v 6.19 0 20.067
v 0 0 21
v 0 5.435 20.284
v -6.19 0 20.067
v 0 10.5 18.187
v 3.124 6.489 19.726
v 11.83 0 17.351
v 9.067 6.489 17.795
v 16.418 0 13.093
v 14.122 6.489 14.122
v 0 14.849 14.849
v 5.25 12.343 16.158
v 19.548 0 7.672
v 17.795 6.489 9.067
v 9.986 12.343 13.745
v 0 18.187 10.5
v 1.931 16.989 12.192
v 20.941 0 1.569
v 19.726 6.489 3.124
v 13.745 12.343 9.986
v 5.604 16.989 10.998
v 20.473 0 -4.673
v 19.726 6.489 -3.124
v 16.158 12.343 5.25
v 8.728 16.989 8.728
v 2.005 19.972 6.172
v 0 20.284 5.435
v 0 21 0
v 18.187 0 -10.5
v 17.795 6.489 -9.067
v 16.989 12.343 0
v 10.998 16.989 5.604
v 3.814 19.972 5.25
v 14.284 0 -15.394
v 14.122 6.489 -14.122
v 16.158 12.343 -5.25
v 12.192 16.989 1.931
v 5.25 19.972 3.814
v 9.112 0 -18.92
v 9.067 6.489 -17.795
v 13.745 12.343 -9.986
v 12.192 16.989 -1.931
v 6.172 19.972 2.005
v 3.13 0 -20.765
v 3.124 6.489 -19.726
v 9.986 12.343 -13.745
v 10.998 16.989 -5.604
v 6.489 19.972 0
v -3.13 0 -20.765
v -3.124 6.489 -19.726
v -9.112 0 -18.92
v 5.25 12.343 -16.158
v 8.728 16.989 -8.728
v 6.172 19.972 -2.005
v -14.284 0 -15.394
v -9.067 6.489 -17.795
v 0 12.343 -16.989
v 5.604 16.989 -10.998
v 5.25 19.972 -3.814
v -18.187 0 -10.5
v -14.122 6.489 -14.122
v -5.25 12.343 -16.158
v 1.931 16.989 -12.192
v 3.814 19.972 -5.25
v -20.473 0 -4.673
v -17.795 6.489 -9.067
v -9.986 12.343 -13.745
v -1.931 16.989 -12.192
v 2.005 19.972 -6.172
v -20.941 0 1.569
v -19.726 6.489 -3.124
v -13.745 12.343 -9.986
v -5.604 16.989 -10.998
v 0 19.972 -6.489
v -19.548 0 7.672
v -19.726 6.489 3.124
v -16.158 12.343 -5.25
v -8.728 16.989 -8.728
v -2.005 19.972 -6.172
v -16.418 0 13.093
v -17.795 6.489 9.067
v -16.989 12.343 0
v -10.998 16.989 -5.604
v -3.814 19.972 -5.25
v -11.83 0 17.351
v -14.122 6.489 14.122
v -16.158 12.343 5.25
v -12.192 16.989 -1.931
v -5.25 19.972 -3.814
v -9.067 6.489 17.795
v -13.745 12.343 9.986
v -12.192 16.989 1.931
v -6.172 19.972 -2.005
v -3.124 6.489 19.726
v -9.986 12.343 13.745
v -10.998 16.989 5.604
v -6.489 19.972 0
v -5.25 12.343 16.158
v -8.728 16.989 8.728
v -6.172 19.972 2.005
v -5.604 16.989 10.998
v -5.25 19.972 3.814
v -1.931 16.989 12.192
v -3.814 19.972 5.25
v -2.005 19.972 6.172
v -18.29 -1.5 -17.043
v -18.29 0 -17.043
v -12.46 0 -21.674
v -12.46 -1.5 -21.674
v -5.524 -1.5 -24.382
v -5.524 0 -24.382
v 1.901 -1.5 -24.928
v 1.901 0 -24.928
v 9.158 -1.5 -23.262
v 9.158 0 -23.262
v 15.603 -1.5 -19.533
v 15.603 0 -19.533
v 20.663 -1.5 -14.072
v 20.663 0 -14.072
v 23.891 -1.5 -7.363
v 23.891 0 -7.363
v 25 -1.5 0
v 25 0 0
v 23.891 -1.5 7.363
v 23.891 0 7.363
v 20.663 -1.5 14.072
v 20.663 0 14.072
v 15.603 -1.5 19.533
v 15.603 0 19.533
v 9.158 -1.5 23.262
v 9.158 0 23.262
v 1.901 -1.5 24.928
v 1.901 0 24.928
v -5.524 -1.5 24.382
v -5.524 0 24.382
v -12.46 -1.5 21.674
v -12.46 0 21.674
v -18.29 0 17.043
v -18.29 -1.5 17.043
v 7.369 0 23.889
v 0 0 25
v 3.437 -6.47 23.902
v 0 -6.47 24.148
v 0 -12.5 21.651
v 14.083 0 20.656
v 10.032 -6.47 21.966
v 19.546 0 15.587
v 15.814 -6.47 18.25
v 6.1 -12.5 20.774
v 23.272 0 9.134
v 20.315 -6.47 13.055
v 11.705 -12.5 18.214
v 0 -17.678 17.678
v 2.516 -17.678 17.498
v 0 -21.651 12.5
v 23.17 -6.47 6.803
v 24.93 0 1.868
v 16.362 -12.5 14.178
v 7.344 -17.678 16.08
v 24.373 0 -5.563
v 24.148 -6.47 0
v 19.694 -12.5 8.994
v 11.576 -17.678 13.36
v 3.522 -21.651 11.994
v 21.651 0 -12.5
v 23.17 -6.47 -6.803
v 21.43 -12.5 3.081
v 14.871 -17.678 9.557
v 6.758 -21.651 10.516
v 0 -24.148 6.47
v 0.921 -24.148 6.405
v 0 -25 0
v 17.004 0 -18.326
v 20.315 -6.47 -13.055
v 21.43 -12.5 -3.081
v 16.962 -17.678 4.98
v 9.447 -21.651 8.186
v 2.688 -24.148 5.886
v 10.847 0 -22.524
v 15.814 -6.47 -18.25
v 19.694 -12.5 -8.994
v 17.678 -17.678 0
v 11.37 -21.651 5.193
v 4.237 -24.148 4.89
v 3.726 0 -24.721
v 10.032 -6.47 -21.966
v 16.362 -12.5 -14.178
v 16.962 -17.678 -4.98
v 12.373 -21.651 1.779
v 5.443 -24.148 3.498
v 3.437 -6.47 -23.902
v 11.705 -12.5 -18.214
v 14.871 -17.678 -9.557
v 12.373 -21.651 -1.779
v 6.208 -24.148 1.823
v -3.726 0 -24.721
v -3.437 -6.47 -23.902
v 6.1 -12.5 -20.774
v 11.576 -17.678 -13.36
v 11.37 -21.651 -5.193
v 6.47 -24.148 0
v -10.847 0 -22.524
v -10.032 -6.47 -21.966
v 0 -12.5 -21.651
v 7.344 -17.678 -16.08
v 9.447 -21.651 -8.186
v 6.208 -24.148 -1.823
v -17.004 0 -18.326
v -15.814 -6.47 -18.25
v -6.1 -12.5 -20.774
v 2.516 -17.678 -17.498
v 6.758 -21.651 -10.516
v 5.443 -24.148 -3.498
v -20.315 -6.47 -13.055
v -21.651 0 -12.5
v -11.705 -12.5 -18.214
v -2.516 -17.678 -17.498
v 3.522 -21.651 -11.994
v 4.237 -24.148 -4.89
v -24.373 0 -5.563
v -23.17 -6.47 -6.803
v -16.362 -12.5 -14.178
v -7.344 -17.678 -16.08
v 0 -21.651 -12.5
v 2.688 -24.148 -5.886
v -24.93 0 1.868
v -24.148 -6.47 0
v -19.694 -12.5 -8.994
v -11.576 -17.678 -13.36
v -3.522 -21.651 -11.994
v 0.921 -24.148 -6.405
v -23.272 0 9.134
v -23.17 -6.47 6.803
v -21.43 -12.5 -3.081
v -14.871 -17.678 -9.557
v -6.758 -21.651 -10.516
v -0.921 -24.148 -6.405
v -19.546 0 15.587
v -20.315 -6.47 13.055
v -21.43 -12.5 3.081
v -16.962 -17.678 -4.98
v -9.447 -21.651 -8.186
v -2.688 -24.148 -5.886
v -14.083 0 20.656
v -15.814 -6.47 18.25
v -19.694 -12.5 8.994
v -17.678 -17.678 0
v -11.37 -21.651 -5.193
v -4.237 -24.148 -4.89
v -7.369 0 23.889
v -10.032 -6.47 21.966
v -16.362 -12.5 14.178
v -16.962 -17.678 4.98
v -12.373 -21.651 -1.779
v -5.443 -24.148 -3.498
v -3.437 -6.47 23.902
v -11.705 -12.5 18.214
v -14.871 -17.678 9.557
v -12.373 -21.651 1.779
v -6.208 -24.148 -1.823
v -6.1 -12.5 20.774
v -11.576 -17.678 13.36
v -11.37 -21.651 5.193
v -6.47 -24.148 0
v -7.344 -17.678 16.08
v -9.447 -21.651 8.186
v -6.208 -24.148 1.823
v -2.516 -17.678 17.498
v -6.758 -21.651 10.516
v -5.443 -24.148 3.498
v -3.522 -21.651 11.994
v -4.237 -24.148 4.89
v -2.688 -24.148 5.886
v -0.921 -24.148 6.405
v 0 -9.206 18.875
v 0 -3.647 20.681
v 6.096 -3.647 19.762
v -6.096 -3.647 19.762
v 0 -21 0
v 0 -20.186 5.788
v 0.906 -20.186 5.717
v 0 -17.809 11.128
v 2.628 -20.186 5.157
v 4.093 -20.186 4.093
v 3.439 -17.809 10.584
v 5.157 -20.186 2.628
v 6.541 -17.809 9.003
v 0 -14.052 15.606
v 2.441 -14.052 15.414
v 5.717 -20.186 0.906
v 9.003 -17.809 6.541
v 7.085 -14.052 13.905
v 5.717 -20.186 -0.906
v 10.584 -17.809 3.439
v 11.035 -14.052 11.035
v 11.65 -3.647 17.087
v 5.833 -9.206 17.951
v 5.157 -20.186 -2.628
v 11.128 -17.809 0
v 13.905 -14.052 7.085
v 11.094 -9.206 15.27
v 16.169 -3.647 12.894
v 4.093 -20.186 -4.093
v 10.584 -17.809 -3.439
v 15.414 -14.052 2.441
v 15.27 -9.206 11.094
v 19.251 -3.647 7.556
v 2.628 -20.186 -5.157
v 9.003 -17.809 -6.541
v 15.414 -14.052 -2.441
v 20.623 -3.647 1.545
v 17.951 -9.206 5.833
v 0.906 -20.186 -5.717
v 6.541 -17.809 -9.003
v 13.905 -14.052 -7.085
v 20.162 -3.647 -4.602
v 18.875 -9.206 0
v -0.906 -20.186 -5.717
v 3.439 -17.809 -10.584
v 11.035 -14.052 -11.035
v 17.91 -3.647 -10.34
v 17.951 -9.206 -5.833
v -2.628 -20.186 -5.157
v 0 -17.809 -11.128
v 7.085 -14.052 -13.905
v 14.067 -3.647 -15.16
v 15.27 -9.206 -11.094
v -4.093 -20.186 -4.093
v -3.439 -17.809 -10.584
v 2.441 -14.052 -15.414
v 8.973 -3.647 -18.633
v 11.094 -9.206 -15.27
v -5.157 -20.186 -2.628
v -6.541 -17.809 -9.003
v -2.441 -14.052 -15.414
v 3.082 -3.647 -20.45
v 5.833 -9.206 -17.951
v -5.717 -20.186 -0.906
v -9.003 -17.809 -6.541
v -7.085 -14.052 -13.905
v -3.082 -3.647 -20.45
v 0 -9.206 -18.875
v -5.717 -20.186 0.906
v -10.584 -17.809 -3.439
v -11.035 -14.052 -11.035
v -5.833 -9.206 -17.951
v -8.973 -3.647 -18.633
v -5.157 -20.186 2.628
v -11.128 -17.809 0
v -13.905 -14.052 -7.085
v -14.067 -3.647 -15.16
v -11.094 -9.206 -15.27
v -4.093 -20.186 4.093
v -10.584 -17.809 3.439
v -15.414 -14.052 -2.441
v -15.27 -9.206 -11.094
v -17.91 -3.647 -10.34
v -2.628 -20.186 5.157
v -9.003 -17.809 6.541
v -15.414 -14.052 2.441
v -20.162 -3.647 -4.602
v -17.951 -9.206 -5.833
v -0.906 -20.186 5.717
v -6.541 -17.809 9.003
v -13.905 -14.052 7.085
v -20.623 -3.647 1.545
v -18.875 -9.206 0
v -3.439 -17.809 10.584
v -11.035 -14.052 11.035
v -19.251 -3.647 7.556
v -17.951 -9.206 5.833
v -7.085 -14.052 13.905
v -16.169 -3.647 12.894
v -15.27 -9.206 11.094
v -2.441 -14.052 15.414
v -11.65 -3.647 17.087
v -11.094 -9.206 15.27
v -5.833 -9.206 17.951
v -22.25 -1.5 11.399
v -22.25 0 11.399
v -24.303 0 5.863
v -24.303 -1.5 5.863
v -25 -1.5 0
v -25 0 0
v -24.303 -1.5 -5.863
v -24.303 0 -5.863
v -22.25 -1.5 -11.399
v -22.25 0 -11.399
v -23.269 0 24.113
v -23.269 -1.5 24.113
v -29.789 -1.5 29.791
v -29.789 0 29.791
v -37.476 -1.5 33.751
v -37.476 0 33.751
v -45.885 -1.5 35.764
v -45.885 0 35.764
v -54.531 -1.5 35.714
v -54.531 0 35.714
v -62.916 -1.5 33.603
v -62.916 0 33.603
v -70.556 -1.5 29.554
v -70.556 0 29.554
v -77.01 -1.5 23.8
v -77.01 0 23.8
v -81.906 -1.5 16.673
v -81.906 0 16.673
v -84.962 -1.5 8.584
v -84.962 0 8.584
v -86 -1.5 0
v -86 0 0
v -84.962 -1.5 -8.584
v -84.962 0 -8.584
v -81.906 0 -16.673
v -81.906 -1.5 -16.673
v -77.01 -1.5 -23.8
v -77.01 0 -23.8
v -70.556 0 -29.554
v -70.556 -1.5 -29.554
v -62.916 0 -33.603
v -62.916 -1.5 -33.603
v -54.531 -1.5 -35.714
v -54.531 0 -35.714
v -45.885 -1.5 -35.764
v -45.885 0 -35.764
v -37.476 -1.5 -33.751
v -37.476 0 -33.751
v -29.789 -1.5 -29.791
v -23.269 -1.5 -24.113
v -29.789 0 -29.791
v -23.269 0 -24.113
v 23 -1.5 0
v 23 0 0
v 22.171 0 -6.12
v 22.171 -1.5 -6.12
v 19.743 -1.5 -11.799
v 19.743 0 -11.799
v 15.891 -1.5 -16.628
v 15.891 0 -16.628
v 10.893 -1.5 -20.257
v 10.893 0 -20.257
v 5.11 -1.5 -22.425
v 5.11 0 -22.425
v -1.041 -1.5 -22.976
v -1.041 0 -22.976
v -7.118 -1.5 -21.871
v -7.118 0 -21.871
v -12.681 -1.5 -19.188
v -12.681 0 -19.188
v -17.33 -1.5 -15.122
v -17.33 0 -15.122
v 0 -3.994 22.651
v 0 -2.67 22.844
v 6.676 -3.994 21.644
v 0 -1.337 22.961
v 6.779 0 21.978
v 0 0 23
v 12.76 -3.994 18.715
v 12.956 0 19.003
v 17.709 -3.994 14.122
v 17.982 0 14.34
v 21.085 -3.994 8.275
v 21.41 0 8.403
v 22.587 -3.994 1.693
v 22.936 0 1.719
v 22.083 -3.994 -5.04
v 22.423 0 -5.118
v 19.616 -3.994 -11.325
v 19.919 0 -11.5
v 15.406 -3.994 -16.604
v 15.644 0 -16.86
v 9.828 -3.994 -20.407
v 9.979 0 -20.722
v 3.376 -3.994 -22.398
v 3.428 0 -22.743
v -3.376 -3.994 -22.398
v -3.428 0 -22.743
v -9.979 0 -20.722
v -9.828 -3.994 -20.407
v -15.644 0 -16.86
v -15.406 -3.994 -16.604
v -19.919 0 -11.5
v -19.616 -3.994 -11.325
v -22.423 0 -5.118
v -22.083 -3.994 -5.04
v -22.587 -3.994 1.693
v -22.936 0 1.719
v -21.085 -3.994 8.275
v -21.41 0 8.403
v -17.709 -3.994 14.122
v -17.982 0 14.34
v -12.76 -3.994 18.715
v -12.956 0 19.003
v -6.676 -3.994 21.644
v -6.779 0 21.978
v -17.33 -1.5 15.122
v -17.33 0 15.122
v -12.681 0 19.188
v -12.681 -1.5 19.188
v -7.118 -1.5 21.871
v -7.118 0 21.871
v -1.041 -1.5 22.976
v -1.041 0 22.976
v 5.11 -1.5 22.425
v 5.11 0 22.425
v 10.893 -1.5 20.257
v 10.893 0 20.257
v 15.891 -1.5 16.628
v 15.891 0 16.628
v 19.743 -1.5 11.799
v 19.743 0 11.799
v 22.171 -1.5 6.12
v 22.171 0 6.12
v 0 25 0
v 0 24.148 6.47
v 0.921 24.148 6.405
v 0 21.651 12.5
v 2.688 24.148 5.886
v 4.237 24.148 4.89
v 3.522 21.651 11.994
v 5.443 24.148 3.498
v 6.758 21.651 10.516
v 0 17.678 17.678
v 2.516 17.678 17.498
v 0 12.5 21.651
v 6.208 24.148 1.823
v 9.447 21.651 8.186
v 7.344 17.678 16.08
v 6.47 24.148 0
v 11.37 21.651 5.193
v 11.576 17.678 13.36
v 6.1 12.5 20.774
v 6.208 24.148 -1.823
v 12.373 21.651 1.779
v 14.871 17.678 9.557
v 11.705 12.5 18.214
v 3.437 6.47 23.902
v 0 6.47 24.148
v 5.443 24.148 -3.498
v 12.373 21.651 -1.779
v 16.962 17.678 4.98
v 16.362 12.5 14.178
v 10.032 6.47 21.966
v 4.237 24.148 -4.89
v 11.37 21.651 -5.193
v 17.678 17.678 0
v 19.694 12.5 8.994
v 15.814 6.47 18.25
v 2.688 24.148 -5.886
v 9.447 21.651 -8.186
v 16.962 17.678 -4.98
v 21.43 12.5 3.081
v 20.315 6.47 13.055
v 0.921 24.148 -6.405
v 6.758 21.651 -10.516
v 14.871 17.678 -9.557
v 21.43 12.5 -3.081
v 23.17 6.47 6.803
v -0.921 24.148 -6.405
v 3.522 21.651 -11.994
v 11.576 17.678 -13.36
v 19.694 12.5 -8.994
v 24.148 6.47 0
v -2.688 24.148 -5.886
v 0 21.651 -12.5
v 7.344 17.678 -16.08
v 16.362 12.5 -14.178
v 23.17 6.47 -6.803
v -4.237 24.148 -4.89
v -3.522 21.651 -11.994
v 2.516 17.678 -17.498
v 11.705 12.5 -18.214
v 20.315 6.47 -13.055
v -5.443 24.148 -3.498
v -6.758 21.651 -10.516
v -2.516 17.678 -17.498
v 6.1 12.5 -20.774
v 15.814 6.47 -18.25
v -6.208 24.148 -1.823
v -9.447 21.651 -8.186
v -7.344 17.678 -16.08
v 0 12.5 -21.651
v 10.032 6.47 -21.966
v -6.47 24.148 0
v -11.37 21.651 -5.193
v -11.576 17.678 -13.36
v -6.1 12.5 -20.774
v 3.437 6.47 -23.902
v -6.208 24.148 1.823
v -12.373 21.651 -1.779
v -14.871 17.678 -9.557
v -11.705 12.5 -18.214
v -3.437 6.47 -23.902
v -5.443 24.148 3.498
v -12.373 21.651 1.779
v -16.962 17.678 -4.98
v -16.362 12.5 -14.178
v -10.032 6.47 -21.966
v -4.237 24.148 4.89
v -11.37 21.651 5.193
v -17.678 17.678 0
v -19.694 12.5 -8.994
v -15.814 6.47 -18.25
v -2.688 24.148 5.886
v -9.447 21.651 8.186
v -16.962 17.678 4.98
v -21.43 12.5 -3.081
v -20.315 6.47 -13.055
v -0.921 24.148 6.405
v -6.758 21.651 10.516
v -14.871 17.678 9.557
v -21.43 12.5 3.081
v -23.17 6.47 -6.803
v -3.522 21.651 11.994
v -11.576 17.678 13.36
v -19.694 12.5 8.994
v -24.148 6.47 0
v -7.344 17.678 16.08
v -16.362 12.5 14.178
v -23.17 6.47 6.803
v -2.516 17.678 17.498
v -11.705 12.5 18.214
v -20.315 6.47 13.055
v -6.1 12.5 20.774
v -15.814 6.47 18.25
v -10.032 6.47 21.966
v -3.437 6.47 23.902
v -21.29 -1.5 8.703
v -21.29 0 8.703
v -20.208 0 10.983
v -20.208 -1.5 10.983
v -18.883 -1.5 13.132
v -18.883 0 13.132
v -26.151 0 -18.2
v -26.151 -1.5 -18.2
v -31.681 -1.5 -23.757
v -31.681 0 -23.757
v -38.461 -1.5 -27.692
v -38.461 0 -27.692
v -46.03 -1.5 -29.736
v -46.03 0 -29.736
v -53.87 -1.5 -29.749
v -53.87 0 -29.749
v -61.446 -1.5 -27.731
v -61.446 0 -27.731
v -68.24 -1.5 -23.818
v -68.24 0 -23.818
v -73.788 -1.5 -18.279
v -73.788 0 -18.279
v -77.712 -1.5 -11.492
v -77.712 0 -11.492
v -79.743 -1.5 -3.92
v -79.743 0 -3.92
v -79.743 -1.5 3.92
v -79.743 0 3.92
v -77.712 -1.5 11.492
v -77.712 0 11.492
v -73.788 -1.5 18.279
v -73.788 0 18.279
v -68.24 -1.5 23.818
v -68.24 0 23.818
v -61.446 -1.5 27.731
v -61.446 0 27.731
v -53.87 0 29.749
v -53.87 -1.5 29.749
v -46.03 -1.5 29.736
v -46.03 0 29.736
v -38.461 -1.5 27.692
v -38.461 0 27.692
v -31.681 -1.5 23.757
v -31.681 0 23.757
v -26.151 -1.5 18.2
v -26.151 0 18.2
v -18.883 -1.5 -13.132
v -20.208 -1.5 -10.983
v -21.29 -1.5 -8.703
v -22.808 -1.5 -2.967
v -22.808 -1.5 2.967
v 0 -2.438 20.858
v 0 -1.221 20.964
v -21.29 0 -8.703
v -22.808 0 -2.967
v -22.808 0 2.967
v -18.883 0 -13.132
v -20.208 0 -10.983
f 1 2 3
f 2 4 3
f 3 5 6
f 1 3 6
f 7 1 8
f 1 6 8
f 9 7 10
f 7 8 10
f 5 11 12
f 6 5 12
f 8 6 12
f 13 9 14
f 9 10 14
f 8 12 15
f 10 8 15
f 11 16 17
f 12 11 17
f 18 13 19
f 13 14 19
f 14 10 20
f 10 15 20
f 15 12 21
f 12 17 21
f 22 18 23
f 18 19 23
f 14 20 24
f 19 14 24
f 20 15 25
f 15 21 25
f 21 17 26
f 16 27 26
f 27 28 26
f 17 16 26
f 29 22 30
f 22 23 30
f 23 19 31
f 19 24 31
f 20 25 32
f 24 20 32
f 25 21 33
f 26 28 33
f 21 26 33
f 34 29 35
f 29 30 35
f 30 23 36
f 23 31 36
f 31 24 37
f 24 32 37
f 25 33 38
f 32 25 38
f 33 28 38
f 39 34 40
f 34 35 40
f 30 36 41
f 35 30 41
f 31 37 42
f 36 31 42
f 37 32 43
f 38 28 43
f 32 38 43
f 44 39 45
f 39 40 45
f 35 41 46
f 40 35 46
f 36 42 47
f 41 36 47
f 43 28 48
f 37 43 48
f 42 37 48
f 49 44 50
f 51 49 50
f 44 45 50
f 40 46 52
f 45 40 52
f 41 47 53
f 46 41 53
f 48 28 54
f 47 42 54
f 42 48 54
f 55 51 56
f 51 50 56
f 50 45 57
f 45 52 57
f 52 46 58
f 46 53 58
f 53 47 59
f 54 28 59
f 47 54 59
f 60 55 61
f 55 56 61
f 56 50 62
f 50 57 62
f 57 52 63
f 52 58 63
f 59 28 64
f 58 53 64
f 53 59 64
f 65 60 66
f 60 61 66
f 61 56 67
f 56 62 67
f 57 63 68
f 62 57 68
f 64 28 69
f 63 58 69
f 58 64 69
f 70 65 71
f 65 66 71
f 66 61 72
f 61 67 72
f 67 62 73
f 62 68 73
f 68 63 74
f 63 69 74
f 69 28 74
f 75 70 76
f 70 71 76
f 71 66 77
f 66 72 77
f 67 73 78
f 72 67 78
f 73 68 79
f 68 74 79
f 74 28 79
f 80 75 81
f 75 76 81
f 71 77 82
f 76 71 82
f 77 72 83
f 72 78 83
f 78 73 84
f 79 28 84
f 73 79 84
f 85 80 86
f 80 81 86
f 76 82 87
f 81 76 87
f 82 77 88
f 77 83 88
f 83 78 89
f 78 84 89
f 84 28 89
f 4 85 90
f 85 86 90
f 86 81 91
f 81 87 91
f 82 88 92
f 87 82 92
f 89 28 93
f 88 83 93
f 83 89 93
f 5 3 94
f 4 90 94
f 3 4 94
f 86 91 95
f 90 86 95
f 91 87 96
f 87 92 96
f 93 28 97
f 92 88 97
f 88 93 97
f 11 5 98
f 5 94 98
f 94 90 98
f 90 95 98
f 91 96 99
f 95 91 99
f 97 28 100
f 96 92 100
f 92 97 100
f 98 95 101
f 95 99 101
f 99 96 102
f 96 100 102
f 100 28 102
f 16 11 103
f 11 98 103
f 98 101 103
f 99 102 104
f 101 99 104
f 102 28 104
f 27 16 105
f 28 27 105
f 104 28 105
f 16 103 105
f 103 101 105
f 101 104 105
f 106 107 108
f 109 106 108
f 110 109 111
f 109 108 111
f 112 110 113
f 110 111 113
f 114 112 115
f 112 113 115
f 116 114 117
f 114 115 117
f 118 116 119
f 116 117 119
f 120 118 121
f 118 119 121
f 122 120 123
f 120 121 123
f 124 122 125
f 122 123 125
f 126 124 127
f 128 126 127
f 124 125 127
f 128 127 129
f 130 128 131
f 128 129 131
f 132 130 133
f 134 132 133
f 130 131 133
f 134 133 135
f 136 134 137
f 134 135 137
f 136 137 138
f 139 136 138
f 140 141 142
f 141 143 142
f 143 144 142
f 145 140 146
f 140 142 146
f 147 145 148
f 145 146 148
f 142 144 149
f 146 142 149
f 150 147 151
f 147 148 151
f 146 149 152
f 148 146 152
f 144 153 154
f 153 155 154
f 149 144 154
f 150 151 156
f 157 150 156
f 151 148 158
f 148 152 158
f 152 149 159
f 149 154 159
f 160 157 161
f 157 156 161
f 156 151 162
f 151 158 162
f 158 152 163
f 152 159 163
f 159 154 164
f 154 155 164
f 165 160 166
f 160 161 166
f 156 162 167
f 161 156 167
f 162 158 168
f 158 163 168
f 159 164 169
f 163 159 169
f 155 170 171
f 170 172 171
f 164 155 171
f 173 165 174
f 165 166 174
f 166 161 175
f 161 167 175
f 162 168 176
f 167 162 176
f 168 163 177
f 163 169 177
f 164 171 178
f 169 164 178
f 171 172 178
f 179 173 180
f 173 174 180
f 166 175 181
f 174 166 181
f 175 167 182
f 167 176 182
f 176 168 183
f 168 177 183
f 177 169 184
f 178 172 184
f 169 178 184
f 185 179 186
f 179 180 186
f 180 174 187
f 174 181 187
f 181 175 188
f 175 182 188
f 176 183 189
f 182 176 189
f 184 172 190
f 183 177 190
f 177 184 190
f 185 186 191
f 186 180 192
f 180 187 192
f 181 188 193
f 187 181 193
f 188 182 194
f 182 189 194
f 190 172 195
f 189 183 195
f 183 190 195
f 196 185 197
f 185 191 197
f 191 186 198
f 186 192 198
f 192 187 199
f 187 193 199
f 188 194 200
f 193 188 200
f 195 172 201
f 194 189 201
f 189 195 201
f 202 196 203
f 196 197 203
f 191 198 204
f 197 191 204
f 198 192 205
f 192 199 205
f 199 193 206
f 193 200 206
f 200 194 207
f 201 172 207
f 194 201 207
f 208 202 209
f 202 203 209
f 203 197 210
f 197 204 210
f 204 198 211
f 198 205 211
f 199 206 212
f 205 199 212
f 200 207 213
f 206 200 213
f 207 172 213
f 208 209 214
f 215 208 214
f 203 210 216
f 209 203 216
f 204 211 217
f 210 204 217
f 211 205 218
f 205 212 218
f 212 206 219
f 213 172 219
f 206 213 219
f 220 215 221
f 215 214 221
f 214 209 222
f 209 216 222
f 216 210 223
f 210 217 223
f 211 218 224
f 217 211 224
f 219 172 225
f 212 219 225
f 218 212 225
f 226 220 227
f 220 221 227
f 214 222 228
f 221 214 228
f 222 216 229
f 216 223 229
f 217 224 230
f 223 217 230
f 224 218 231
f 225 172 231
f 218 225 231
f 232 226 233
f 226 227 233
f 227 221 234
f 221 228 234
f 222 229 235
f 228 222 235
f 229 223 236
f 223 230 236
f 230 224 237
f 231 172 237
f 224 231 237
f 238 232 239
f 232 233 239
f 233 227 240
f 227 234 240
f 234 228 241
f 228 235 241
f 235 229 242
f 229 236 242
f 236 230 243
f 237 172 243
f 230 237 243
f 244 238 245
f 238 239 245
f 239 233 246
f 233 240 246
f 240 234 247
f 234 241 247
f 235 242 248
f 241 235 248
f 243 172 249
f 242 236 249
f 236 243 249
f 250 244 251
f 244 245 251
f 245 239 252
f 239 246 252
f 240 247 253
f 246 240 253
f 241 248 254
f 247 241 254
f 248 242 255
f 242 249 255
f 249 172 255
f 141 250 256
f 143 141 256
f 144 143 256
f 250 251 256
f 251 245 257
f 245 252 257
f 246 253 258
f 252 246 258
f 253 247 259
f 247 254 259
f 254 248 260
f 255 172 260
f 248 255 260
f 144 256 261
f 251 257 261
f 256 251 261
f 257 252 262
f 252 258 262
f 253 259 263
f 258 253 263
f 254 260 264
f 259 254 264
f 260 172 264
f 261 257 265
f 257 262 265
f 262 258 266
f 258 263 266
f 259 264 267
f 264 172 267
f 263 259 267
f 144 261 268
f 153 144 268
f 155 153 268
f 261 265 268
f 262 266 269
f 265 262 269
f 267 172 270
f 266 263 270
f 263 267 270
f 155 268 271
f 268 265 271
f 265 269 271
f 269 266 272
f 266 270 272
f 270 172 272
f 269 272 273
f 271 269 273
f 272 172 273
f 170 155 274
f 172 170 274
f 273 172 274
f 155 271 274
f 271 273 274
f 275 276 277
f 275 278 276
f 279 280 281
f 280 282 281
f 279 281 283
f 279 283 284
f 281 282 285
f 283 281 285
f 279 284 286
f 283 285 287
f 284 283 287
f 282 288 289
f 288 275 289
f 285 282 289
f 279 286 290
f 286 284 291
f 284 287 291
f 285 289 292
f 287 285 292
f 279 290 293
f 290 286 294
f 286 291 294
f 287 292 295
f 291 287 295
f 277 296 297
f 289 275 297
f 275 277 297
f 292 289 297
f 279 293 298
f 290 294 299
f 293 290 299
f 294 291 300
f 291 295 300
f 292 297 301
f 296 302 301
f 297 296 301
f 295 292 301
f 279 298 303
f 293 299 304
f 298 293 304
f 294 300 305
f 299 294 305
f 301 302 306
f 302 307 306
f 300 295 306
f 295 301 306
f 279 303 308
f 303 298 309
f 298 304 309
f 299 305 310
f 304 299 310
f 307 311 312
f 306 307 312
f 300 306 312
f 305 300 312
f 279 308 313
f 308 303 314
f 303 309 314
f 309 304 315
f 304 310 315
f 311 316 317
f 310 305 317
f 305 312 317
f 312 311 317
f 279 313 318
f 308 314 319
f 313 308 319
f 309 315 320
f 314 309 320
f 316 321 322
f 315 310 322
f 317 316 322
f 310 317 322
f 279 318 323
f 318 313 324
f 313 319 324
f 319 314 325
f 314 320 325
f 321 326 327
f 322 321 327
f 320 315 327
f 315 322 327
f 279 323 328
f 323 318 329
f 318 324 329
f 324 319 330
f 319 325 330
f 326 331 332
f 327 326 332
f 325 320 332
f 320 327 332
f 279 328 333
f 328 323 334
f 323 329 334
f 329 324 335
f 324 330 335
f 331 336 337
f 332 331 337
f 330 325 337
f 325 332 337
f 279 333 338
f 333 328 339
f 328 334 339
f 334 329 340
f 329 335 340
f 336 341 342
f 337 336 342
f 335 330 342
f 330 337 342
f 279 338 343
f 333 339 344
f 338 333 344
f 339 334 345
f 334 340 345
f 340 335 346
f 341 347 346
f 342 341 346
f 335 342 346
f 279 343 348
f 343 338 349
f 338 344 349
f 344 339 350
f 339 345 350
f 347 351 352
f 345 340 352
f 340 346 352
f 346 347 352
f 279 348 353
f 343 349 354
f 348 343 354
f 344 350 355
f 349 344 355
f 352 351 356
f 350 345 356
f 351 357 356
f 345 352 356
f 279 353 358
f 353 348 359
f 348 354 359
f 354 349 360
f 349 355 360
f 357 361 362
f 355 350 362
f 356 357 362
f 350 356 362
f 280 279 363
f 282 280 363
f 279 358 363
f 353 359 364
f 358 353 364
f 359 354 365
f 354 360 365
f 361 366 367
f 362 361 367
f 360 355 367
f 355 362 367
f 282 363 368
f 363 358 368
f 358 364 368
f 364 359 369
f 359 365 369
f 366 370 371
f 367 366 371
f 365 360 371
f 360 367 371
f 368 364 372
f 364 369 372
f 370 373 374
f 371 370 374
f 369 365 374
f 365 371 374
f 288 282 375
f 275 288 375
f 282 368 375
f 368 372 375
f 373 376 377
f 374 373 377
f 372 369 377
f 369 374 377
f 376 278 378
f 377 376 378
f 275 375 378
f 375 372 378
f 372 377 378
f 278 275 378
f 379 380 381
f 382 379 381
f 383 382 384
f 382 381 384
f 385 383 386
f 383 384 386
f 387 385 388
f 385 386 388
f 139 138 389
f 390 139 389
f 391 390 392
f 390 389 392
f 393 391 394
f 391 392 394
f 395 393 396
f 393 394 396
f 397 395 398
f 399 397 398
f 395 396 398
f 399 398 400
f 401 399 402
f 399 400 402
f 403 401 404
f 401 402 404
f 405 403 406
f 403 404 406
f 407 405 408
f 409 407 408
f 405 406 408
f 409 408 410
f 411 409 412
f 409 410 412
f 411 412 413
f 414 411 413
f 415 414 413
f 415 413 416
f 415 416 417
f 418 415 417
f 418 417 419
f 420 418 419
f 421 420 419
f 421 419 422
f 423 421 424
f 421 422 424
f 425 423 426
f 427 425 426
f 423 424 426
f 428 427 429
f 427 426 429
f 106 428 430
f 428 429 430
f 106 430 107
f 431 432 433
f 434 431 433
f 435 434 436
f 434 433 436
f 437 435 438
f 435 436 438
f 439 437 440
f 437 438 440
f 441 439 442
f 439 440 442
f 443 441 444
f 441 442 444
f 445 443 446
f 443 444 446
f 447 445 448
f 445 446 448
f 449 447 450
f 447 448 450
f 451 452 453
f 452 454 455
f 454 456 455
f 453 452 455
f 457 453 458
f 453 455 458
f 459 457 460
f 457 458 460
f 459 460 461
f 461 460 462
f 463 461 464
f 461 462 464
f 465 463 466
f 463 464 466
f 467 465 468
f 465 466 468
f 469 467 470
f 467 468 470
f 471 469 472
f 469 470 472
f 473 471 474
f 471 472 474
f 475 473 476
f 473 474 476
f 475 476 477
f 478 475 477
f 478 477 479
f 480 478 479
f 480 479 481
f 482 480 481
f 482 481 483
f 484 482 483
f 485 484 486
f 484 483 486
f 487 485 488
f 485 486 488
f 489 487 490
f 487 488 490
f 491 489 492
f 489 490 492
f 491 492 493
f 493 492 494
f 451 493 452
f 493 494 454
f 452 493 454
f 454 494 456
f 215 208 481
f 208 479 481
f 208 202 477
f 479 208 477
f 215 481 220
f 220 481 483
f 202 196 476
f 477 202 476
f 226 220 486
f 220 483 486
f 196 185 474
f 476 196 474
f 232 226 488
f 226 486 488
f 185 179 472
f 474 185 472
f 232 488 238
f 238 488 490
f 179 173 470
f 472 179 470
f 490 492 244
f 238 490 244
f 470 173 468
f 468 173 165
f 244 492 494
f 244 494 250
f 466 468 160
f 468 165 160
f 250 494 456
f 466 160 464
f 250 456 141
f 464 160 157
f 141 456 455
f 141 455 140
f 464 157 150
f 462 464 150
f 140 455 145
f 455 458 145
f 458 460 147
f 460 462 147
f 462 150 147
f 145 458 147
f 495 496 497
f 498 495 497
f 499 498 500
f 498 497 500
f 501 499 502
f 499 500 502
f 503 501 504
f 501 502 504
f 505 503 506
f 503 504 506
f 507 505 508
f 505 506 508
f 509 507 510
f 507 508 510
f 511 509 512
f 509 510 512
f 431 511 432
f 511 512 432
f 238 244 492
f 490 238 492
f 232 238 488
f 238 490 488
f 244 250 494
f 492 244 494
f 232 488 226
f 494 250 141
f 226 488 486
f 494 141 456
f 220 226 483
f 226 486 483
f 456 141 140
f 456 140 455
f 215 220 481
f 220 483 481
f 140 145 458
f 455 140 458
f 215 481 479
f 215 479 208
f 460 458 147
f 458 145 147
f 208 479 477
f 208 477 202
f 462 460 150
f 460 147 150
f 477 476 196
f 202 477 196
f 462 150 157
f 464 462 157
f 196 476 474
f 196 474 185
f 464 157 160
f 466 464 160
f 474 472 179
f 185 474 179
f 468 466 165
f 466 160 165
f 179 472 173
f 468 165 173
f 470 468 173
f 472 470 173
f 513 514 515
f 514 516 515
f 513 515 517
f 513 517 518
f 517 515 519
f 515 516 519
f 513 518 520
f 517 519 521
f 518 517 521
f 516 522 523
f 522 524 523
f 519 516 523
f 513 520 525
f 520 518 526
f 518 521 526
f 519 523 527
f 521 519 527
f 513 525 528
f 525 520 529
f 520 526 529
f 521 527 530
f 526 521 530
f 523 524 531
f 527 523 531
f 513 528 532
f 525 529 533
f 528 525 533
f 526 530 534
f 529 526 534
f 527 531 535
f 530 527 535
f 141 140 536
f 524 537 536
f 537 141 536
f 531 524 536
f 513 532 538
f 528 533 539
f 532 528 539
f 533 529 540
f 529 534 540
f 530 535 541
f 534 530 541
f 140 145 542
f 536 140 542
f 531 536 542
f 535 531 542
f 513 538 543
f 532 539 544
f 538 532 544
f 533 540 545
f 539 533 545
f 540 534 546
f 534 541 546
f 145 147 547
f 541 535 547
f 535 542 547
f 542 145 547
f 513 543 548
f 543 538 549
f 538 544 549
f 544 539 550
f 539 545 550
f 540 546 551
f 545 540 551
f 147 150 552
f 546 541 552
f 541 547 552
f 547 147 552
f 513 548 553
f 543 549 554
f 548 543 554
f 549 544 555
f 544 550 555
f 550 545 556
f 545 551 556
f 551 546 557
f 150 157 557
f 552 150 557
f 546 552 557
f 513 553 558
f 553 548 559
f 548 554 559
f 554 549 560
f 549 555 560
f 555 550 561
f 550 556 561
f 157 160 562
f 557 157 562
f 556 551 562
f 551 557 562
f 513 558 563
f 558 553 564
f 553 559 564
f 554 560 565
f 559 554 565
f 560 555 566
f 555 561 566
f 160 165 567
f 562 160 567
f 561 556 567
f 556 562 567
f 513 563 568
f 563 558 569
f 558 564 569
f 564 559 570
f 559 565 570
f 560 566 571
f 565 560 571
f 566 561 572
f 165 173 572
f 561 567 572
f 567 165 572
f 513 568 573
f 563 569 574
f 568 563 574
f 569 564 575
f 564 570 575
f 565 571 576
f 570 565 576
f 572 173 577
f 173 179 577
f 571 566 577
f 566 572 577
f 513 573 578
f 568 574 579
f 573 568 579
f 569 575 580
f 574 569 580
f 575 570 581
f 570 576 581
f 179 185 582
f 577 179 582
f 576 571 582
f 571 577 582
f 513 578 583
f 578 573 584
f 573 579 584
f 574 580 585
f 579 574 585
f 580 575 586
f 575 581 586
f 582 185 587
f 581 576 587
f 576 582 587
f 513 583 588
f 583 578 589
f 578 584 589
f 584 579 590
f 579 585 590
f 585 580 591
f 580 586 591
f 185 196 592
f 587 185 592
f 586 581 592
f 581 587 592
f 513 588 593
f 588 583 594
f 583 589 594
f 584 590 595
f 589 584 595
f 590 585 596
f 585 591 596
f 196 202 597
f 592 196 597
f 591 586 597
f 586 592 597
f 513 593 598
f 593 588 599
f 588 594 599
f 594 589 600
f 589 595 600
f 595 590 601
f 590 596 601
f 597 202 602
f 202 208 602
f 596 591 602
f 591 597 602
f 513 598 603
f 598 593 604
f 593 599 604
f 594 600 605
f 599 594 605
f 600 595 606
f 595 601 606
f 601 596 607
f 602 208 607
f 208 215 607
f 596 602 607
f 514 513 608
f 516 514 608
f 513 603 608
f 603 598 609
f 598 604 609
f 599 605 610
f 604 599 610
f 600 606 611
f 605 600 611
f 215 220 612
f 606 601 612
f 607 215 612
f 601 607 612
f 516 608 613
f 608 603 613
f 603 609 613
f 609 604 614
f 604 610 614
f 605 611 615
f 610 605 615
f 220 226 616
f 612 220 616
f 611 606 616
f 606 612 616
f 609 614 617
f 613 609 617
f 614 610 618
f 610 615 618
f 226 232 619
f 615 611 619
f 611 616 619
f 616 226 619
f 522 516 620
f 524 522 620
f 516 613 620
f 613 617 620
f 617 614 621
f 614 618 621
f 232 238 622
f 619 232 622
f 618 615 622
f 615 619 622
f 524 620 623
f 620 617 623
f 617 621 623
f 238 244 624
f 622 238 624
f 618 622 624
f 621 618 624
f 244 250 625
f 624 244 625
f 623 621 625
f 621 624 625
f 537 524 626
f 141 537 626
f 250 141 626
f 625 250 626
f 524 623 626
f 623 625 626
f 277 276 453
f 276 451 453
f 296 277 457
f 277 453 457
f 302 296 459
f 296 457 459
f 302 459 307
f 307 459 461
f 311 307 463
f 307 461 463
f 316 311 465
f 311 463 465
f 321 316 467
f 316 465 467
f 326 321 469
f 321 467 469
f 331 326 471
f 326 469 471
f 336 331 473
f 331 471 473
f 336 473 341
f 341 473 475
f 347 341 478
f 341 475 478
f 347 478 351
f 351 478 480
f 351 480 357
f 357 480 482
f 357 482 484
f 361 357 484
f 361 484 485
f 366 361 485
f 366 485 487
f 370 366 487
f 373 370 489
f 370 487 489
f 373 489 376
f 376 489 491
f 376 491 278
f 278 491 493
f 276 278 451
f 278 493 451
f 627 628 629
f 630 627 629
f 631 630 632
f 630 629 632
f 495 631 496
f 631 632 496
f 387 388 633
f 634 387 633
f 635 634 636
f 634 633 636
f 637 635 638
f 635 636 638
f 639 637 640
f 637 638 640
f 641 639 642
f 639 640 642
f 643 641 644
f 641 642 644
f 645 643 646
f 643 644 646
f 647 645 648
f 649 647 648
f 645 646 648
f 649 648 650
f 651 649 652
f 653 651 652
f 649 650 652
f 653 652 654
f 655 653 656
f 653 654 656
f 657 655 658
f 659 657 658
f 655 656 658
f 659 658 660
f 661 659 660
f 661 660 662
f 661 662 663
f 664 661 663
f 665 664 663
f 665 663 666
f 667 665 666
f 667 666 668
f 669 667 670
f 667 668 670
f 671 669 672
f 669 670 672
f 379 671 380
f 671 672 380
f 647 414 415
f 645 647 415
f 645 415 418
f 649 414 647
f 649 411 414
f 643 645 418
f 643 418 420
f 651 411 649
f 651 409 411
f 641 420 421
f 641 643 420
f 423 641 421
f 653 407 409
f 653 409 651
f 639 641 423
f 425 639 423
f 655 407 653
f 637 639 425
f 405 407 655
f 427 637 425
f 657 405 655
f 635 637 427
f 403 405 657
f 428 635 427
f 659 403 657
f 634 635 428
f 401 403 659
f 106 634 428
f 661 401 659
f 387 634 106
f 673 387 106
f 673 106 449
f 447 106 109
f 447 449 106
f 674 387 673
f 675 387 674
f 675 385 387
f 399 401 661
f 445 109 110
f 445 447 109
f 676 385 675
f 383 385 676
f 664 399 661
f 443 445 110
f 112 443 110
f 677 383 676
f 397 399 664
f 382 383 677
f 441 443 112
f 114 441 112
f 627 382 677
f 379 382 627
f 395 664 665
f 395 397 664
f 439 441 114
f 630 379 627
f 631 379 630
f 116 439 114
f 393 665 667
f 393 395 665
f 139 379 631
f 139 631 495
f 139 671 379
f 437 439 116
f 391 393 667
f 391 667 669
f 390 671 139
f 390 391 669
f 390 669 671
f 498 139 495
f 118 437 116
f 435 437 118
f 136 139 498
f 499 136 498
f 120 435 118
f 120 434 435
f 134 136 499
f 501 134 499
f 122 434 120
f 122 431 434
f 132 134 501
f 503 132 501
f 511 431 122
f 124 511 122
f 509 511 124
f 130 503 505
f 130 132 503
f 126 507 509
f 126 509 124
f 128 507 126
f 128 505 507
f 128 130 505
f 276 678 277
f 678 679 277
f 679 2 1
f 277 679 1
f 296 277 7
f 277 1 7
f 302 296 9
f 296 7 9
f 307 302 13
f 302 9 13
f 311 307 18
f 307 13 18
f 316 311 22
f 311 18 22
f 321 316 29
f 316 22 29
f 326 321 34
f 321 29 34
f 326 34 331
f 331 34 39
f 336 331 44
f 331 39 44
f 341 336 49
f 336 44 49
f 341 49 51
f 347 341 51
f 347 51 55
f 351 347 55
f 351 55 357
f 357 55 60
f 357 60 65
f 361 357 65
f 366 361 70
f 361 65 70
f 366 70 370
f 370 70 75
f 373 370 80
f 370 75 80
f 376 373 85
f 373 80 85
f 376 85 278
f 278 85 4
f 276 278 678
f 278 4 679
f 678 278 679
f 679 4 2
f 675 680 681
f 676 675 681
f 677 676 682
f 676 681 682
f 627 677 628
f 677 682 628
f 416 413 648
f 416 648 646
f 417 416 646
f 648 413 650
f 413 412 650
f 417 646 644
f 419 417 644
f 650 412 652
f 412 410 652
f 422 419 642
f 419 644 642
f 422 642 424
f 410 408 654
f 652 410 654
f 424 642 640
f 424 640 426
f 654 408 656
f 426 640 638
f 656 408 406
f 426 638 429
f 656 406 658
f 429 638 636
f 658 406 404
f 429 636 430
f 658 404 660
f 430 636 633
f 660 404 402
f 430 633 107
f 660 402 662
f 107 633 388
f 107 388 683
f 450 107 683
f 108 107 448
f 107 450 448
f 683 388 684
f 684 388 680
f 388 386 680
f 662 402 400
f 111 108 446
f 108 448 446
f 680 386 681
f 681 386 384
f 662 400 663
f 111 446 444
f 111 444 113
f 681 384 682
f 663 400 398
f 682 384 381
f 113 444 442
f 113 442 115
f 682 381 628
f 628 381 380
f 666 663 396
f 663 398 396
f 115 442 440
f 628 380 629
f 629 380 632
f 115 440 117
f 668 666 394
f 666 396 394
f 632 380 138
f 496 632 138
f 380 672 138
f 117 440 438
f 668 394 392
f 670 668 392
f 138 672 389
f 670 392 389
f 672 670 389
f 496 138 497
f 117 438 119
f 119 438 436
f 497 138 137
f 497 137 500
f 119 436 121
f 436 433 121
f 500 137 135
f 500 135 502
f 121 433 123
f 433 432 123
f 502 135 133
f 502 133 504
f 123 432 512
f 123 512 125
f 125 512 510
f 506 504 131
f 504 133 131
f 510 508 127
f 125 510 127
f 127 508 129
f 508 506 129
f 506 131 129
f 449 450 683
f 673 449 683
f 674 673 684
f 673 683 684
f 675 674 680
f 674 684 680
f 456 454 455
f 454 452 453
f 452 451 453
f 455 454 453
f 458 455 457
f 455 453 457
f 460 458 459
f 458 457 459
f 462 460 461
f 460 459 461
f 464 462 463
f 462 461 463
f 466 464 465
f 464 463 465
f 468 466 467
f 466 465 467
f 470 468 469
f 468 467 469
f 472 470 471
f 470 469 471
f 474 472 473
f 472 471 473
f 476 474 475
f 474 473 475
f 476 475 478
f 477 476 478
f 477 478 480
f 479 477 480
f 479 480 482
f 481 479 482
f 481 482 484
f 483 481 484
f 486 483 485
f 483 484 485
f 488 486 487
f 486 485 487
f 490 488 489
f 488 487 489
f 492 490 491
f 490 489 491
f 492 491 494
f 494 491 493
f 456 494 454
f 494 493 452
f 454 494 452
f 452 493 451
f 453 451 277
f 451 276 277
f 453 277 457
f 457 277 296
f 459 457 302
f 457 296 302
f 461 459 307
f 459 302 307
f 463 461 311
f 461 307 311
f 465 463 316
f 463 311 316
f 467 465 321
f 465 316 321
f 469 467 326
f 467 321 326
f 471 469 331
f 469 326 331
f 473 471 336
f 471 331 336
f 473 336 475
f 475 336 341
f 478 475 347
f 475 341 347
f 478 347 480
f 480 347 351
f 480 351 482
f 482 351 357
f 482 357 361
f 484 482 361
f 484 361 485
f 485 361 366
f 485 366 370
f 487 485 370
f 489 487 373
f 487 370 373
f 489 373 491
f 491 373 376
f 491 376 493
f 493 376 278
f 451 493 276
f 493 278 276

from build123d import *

# Parameters (mm, degrees)
F3_DEPTH = 1.5


with BuildPart() as f3:
    # F2 (on Front) → F3 (new body)
    with BuildSketch(Plane.XZ):
        with BuildLine():
            ThreePointArc((-22.25, 11.3990131152), (-20.4655208758, 14.358358377), (-18.29, 17.0433535432))
            ThreePointArc((-18.29, 17.0433535432), (-86, 0), (-18.29, -17.0433535432))
            ThreePointArc((-18.29, -17.0433535432), (-20.4655208758, -14.358358377), (-22.25, -11.3990131152))
            ThreePointArc((-22.25, -11.3990131152), (-80, 0), (-22.25, 11.3990131152))
        make_face()
        with BuildLine():
            ThreePointArc((-17.33, 15.1218748838), (-17.7956661292, 16.0897756336), (-18.29, 17.0433535432))
            ThreePointArc((-18.29, 17.0433535432), (-20.4655208758, 14.358358377), (-22.25, 11.3990131152))
            ThreePointArc((-22.25, 11.3990131152), (-21.7378254495, 10.0622805406), (-21.29, 8.7026375312))
            ThreePointArc((-21.29, 8.7026375312), (-19.5749266166, 12.0756883014), (-17.33, 15.1218748838))
        make_face()
        with BuildLine():
            ThreePointArc((-22.25, -11.3990131152), (-20.4655208758, -14.358358377), (-18.29, -17.0433535432))
            ThreePointArc((-18.29, -17.0433535432), (-17.7956661292, -16.0897756336), (-17.33, -15.1218748838))
            ThreePointArc((-17.33, -15.1218748838), (-19.5749266166, -12.0756883014), (-21.29, -8.7026375312))
            ThreePointArc((-21.29, -8.7026375312), (-21.7378254495, -10.0622805406), (-22.25, -11.3990131152))
        make_face()
        with BuildLine():
            ThreePointArc((-21.29, 8.7026375312), (-21.7378254495, 10.0622805406), (-22.25, 11.3990131152))
            ThreePointArc((-22.25, 11.3990131152), (-25, 0), (-22.25, -11.3990131152))
            ThreePointArc((-22.25, -11.3990131152), (-21.7378254495, -10.0622805406), (-21.29, -8.7026375312))
            ThreePointArc((-21.29, -8.7026375312), (-23, 0), (-21.29, 8.7026375312))
        make_face()
        with BuildLine():
            ThreePointArc((-18.29, -17.0433535432), (9.158329542, -23.2620936289), (25, 0))
            ThreePointArc((25, 0), (9.158329542, 23.2620936289), (-18.29, 17.0433535432))
            ThreePointArc((-18.29, 17.0433535432), (-17.7956661292, 16.0897756336), (-17.33, 15.1218748838))
            ThreePointArc((-17.33, 15.1218748838), (8.0749613002, 21.5359002598), (23, 0))
            ThreePointArc((23, 0), (8.0749613002, -21.5359002598), (-17.33, -15.1218748838))
            ThreePointArc((-17.33, -15.1218748838), (-17.7956661292, -16.0897756336), (-18.29, -17.0433535432))
        make_face()
    extrude(amount=F3_DEPTH)


with BuildPart() as f4:
    # F0 (on Right) → F4 (revolve)
    with BuildSketch(Plane.YZ):
        with BuildLine():
            Line((0, 23), (0, 25))
            ThreePointArc((0, 25), (-17.6776695297, 17.6776695297), (-25, 0))
            Line((-25, 0), (-23, 0))
            ThreePointArc((-23, 0), (-17.6190221917, 14.7841150228), (-3.9939080863, 22.6505783193))
            ThreePointArc((-3.9939080863, 22.6505783193), (-2.0045820832, 22.9124780561), (0, 23))
        make_face()
        with BuildLine():
            ThreePointArc((-3.9939080863, 22.6505783193), (-17.6190221917, 14.7841150228), (-23, 0))
            Line((-23, 0), (-21, 0))
            ThreePointArc((-21, 0), (-16.0869333055, 13.4985398034), (-3.646611731, 20.6809628133))
            Line((-3.646611731, 20.6809628133), (-3.9939080863, 22.6505783193))
        make_face()
    revolve(axis=Axis((0, 0, 0), (0, 1, 0)))


with BuildPart() as f5:
    # F0 (on Right) → F5 (revolve)
    with BuildSketch(Plane.YZ):
        with BuildLine():
            Line((0, 21), (0, 23))
            ThreePointArc((0, 23), (-2.0045820832, 22.9124780561), (-3.9939080863, 22.6505783193))
            Line((-3.9939080863, 22.6505783193), (-3.646611731, 20.6809628133))
            ThreePointArc((-3.646611731, 20.6809628133), (-1.8302705977, 20.9200886599), (0, 21))
        make_face()
        with BuildLine():
            Line((21, 0), (23, 0))
            ThreePointArc((23, 0), (16.2634559673, 16.2634559673), (0, 23))
            Line((0, 23), (0, 21))
            ThreePointArc((0, 21), (14.8492424049, 14.8492424049), (21, 0))
        make_face()
        with BuildLine():
            Line((23, 0), (25, 0))
            ThreePointArc((25, 0), (17.6776695297, 17.6776695297), (0, 25))
            Line((0, 25), (0, 23))
            ThreePointArc((0, 23), (16.2634559673, 16.2634559673), (23, 0))
        make_face()
    revolve(axis=Axis((0, 0, 0), (0, 1, 0)))


solid = Compound([f3.part, f4.part, f5.part])
